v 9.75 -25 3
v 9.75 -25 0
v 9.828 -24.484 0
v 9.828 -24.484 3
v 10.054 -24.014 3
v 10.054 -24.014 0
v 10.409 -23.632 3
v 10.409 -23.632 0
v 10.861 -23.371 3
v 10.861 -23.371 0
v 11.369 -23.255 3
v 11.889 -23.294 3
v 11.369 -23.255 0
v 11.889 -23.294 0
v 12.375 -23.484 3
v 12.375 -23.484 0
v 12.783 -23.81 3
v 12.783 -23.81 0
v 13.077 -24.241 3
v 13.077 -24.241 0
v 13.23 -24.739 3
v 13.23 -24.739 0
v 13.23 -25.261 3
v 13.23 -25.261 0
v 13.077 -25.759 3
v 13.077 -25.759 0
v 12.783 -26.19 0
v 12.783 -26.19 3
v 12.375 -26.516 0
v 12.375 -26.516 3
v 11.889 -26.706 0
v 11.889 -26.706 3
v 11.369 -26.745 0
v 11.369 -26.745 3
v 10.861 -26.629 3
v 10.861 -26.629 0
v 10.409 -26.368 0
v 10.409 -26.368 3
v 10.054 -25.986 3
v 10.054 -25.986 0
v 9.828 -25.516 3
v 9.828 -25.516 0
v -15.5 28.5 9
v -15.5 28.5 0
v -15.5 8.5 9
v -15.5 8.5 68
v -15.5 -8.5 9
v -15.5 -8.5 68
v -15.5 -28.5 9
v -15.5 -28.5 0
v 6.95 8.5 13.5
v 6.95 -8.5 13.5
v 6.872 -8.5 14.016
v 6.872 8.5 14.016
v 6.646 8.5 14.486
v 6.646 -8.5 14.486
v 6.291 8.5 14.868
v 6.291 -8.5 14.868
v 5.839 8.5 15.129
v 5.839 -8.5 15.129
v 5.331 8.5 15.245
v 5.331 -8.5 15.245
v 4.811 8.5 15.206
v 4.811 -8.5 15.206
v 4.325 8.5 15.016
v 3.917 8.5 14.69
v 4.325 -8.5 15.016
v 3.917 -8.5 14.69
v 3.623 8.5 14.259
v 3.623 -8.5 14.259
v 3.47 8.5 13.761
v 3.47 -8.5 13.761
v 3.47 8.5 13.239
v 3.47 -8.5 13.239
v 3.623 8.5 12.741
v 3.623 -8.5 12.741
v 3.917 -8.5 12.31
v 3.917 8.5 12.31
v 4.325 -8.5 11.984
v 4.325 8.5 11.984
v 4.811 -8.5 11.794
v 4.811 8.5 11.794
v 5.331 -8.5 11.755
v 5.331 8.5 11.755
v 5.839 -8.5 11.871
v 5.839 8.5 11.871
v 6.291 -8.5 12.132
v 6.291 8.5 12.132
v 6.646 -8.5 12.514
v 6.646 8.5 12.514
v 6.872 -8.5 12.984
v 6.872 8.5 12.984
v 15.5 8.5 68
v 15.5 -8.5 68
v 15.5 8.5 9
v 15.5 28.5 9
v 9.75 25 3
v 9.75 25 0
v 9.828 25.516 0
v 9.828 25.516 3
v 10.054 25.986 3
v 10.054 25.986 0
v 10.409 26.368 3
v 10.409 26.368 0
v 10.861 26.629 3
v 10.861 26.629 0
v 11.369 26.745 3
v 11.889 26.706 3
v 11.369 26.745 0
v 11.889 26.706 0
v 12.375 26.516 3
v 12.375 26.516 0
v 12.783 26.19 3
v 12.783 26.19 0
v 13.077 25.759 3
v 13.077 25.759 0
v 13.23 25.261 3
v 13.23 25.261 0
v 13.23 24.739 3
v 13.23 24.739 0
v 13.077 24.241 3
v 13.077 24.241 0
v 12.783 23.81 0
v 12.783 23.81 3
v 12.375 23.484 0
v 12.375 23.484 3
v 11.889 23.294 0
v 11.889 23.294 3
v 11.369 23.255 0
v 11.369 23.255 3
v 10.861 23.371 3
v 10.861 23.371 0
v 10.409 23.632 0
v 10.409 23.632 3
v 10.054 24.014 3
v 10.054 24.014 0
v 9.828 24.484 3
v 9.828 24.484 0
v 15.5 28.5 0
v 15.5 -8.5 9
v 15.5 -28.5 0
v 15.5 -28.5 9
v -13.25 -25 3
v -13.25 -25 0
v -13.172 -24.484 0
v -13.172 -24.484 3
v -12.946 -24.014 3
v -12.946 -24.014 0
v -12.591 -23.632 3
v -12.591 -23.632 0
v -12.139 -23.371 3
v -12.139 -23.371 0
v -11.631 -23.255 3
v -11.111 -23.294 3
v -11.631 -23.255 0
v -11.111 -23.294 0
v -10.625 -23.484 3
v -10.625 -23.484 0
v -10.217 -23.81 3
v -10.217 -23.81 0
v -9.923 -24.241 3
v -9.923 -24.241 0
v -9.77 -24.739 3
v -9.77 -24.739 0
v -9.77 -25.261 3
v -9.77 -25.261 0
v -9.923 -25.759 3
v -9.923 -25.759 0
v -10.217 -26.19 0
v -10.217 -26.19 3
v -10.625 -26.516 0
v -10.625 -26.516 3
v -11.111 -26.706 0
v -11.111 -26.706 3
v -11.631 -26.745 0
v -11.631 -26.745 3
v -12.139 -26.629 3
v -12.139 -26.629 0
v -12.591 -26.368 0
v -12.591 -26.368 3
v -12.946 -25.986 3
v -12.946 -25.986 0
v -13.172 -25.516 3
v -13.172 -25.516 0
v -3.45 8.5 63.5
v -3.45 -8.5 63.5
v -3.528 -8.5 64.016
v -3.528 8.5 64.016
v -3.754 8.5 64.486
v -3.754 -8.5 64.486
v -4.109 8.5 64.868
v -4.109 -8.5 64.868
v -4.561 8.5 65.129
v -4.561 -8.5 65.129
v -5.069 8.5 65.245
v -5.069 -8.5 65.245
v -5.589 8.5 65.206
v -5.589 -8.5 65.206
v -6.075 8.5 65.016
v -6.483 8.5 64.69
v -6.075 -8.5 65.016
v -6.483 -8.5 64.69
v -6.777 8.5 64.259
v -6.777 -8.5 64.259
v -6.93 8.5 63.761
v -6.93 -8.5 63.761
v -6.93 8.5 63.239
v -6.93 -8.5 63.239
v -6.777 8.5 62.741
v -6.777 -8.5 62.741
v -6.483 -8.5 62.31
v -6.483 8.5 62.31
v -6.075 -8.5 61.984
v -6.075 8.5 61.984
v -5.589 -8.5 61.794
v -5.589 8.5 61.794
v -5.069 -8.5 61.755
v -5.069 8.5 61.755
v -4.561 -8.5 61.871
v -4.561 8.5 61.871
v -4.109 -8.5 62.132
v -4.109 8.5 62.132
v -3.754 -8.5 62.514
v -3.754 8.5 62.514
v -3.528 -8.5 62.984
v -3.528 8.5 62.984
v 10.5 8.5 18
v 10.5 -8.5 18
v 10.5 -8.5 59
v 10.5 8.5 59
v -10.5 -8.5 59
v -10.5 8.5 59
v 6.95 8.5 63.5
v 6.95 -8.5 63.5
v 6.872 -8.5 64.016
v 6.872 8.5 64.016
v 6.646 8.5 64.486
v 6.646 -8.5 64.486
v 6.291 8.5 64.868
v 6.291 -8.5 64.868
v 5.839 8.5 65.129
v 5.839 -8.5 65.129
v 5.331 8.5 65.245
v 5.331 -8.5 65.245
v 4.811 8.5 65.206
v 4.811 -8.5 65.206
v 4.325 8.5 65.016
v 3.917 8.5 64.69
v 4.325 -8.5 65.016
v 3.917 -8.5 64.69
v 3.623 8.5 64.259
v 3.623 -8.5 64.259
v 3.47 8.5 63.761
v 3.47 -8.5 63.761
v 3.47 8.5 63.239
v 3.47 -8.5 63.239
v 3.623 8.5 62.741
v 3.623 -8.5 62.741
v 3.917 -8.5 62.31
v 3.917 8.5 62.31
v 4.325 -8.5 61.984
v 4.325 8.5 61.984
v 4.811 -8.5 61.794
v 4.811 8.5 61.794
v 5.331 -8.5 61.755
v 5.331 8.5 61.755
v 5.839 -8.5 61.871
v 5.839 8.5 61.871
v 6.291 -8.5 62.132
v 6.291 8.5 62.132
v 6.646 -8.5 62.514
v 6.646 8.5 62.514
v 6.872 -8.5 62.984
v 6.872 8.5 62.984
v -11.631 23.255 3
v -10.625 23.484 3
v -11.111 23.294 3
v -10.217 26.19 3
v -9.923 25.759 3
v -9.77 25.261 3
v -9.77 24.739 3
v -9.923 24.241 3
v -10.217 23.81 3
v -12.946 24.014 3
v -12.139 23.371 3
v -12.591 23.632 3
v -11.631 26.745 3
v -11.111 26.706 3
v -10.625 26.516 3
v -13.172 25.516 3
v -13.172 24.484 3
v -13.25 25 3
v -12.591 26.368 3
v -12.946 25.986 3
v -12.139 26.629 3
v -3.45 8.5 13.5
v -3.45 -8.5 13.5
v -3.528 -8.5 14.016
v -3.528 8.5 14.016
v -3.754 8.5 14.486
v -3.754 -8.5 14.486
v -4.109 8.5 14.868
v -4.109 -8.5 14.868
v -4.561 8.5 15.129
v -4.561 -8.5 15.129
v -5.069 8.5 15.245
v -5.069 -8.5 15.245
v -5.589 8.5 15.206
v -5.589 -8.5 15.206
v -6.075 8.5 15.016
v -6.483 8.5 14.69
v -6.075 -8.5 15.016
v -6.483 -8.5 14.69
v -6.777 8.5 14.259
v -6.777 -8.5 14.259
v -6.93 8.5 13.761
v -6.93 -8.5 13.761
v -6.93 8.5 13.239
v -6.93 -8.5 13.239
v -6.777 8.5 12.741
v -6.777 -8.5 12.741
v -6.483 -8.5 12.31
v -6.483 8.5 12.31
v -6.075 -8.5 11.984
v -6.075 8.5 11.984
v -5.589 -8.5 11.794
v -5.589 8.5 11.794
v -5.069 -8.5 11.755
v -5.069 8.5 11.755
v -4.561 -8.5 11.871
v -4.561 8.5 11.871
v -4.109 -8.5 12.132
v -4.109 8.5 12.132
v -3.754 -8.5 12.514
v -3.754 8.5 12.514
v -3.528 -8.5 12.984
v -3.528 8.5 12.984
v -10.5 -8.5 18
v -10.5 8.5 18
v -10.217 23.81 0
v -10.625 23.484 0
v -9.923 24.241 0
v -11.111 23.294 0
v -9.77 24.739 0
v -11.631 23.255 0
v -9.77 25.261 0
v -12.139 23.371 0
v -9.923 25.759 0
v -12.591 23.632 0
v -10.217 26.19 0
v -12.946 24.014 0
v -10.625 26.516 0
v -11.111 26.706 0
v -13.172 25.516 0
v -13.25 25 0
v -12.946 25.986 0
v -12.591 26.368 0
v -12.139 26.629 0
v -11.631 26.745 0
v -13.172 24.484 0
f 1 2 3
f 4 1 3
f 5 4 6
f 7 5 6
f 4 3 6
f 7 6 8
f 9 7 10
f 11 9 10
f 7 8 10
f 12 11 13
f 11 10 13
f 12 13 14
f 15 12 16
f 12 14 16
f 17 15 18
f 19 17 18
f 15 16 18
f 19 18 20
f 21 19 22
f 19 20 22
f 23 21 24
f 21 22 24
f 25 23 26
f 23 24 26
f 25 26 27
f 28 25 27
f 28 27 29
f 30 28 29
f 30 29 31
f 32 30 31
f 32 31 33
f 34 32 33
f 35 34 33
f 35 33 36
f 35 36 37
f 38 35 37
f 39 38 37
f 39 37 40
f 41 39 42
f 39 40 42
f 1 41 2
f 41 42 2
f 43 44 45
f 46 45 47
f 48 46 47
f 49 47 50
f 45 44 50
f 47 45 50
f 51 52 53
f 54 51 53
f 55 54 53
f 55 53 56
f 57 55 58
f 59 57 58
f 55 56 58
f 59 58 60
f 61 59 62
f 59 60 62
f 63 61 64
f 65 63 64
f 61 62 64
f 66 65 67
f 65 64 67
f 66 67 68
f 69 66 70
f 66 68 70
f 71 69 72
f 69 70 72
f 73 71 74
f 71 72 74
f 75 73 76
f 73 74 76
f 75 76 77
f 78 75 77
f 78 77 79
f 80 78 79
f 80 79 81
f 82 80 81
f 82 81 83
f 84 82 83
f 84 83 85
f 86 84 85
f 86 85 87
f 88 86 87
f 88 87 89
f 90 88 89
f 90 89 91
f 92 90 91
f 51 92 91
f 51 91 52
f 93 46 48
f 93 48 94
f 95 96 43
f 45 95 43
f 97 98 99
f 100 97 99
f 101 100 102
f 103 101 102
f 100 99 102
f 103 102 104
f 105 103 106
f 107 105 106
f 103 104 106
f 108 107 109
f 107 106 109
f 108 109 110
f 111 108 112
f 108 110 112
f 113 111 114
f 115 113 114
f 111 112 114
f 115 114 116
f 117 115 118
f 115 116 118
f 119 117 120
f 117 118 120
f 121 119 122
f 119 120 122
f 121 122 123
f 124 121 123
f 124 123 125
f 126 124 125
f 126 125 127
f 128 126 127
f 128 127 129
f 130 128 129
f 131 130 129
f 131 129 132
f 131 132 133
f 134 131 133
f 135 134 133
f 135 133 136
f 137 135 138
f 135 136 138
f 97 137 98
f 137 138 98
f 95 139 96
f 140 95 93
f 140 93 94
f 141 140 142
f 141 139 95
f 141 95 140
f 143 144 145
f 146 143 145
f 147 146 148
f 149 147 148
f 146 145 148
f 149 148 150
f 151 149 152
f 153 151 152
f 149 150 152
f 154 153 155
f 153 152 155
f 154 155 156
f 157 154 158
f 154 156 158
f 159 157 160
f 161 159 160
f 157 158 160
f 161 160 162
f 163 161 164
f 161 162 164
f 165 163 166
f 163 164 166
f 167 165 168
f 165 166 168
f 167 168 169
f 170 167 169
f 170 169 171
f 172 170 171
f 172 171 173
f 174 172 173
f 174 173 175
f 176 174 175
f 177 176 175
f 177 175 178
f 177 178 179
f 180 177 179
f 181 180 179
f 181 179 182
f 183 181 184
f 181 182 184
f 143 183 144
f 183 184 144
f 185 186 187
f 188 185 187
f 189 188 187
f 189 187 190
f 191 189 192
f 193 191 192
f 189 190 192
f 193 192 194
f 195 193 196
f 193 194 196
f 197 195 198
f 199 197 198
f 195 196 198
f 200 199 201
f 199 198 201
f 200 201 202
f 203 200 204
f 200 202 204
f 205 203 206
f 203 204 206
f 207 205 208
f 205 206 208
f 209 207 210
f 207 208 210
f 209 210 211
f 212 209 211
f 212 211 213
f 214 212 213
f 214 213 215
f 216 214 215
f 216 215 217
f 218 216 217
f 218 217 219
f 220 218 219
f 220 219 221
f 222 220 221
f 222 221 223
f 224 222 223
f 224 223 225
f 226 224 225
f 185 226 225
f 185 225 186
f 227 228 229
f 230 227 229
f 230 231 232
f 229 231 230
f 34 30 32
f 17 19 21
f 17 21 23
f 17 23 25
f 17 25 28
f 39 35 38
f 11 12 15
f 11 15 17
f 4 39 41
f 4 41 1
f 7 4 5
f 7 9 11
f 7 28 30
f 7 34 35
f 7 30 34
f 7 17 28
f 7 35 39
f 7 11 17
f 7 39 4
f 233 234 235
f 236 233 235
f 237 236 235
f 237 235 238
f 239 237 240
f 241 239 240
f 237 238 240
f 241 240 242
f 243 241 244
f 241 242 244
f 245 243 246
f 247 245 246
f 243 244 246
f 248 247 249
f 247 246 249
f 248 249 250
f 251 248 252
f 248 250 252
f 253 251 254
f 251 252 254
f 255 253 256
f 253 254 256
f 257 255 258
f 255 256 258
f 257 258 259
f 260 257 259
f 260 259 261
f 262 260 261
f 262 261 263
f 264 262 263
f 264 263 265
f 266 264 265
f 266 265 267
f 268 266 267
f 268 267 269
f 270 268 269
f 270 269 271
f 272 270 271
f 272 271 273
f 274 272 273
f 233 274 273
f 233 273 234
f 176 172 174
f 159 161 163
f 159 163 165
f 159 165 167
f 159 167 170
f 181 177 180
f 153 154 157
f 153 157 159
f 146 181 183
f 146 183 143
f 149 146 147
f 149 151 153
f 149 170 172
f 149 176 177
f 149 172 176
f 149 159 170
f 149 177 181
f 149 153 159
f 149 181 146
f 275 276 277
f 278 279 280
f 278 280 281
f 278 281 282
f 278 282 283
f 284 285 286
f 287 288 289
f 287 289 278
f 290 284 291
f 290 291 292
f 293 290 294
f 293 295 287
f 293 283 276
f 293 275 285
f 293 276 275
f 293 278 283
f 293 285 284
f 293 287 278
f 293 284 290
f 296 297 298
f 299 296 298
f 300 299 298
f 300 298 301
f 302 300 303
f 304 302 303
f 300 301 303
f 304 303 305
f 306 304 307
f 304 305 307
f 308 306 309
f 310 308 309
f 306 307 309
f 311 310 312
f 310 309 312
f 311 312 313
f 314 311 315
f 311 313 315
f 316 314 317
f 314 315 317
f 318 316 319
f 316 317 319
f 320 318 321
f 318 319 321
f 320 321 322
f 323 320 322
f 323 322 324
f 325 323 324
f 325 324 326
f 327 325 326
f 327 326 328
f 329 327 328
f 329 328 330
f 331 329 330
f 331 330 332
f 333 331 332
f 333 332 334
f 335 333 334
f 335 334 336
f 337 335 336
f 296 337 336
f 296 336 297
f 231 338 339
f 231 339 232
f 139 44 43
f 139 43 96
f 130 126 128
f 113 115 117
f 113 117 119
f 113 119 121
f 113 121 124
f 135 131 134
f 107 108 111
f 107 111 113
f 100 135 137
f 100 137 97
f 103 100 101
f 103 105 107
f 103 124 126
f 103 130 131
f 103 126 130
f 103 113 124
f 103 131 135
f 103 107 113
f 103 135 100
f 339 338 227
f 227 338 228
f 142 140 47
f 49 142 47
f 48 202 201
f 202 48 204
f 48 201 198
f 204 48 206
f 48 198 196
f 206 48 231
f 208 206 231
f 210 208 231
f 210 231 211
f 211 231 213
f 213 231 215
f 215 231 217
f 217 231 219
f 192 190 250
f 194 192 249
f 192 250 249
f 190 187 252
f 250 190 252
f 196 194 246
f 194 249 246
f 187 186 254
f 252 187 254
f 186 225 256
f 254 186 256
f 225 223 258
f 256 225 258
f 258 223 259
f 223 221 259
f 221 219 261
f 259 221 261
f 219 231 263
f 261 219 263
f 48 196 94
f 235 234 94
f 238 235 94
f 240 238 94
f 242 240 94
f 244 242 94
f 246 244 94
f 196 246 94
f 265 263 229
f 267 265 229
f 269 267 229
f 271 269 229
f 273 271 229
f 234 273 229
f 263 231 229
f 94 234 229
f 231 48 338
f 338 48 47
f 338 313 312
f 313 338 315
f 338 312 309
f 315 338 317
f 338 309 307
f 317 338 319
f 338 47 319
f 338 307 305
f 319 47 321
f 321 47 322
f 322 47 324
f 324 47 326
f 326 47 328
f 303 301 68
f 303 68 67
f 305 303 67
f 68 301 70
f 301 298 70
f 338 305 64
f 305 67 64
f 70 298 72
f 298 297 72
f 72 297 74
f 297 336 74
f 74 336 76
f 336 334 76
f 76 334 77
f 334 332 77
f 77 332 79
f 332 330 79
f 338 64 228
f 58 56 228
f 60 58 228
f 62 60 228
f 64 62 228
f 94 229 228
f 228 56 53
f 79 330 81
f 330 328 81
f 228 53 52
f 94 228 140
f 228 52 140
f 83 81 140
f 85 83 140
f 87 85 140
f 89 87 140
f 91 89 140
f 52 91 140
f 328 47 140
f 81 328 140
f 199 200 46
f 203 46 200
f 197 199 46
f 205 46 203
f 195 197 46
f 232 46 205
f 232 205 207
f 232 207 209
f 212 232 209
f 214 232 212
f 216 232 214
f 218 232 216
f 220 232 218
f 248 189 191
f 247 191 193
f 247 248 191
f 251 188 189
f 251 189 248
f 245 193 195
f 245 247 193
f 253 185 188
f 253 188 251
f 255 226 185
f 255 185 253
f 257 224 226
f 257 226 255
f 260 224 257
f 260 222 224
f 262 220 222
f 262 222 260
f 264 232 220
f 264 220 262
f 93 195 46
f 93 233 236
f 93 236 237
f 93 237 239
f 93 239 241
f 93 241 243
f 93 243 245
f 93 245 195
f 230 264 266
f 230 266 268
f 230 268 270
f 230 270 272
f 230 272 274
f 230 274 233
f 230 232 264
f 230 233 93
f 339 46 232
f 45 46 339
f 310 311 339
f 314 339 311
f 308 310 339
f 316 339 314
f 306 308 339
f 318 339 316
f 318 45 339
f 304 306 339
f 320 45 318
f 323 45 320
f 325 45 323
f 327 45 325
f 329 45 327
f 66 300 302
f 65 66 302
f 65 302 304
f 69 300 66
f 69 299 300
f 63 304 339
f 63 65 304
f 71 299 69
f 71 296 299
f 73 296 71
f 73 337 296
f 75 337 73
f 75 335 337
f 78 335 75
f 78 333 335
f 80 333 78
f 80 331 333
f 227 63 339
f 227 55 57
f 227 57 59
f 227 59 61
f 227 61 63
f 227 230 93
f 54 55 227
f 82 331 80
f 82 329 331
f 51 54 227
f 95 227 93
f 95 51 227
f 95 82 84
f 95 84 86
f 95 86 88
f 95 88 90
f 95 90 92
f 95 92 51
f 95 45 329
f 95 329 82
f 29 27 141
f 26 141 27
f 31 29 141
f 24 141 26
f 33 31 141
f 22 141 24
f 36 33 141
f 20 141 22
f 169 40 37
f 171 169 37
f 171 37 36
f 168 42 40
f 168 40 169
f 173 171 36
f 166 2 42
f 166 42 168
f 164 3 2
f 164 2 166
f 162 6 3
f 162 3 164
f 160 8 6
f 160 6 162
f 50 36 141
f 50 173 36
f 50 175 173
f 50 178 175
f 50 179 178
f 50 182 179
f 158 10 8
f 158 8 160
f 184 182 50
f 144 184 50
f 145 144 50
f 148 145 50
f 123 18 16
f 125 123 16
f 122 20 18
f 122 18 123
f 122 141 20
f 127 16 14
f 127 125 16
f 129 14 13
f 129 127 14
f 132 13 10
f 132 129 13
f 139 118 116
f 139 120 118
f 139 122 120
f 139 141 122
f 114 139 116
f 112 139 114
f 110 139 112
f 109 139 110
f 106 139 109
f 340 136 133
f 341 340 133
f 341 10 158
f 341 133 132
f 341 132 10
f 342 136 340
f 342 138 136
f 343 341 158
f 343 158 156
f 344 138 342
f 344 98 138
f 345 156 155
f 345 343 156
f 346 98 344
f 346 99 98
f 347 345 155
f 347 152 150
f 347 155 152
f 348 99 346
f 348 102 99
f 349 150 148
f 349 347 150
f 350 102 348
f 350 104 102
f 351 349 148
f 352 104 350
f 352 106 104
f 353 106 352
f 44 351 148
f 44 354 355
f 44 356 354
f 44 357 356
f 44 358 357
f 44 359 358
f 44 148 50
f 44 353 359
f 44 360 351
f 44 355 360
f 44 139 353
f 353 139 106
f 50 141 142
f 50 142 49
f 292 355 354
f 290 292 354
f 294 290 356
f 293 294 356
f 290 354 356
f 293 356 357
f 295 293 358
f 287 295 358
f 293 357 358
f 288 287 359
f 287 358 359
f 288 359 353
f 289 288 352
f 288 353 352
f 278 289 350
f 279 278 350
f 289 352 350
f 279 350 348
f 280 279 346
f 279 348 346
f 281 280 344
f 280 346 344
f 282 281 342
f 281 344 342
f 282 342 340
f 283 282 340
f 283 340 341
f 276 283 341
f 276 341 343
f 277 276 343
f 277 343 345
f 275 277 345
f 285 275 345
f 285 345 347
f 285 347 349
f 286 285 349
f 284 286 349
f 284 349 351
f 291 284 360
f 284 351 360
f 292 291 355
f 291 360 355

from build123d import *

# Parameters (mm, degrees)
BOSS_EXTRUDE1_DEPTH = 9
SKETCH10_W          = 31
SKETCH10_H          = 17
BOSS_EXTRUDE5_DEPTH = 59
SKETCH11_R          = 1.75
SKETCH11_W          = 21
SKETCH11_H          = 41
CUT_EXTRUDE6_DEPTH  = 38
SKETCH12_R          = 1.75
CUT_EXTRUDE7_DEPTH  = 3


with BuildPart() as part:
    # Sketch1 → Boss-Extrude1 (new body)
    with BuildSketch(Plane.XY):
        Polygon((15.5, -28.5), (-15.5, -28.5), (-15.5, -10.3), (-15.5, 10.3), (-15.5, 28.5), (15.5, 28.5), align=None)
    extrude(amount=BOSS_EXTRUDE1_DEPTH)

    # Sketch10 → Boss-Extrude5 (add)
    with BuildSketch(Plane.XY.offset(9)):
        Rectangle(SKETCH10_W, SKETCH10_H)
    extrude(amount=BOSS_EXTRUDE5_DEPTH)

    # Sketch11 → Cut-Extrude6 (cut, through all)
    with BuildSketch(Plane.XZ.offset(8.5)):
        with Locations((5.2, 13.5)):
            Circle(SKETCH11_R)
        with Locations((-5.2, 13.5)):
            Circle(SKETCH11_R)
        with Locations((5.2, 63.5)):
            Circle(SKETCH11_R)
        with Locations((-5.2, 63.5)):
            Circle(SKETCH11_R)
        with Locations((0, 38.5)):
            Rectangle(SKETCH11_W, SKETCH11_H)
    extrude(amount=-CUT_EXTRUDE6_DEPTH, mode=Mode.SUBTRACT)

    # Sketch12 → Cut-Extrude7 (cut)
    with BuildSketch(Plane(origin=(0, 0, 0), x_dir=(-1, 0, 0), z_dir=(0, 0, -1))):
        with Locations((11.5, 25)):
            Circle(SKETCH12_R)
        with Locations((-11.5, 25)):
            Circle(SKETCH12_R)
        with Locations((11.5, -25)):
            Circle(SKETCH12_R)
        with Locations((-11.5, -25)):
            Circle(SKETCH12_R)
    extrude(amount=-CUT_EXTRUDE7_DEPTH, mode=Mode.SUBTRACT)


solid = part.part
